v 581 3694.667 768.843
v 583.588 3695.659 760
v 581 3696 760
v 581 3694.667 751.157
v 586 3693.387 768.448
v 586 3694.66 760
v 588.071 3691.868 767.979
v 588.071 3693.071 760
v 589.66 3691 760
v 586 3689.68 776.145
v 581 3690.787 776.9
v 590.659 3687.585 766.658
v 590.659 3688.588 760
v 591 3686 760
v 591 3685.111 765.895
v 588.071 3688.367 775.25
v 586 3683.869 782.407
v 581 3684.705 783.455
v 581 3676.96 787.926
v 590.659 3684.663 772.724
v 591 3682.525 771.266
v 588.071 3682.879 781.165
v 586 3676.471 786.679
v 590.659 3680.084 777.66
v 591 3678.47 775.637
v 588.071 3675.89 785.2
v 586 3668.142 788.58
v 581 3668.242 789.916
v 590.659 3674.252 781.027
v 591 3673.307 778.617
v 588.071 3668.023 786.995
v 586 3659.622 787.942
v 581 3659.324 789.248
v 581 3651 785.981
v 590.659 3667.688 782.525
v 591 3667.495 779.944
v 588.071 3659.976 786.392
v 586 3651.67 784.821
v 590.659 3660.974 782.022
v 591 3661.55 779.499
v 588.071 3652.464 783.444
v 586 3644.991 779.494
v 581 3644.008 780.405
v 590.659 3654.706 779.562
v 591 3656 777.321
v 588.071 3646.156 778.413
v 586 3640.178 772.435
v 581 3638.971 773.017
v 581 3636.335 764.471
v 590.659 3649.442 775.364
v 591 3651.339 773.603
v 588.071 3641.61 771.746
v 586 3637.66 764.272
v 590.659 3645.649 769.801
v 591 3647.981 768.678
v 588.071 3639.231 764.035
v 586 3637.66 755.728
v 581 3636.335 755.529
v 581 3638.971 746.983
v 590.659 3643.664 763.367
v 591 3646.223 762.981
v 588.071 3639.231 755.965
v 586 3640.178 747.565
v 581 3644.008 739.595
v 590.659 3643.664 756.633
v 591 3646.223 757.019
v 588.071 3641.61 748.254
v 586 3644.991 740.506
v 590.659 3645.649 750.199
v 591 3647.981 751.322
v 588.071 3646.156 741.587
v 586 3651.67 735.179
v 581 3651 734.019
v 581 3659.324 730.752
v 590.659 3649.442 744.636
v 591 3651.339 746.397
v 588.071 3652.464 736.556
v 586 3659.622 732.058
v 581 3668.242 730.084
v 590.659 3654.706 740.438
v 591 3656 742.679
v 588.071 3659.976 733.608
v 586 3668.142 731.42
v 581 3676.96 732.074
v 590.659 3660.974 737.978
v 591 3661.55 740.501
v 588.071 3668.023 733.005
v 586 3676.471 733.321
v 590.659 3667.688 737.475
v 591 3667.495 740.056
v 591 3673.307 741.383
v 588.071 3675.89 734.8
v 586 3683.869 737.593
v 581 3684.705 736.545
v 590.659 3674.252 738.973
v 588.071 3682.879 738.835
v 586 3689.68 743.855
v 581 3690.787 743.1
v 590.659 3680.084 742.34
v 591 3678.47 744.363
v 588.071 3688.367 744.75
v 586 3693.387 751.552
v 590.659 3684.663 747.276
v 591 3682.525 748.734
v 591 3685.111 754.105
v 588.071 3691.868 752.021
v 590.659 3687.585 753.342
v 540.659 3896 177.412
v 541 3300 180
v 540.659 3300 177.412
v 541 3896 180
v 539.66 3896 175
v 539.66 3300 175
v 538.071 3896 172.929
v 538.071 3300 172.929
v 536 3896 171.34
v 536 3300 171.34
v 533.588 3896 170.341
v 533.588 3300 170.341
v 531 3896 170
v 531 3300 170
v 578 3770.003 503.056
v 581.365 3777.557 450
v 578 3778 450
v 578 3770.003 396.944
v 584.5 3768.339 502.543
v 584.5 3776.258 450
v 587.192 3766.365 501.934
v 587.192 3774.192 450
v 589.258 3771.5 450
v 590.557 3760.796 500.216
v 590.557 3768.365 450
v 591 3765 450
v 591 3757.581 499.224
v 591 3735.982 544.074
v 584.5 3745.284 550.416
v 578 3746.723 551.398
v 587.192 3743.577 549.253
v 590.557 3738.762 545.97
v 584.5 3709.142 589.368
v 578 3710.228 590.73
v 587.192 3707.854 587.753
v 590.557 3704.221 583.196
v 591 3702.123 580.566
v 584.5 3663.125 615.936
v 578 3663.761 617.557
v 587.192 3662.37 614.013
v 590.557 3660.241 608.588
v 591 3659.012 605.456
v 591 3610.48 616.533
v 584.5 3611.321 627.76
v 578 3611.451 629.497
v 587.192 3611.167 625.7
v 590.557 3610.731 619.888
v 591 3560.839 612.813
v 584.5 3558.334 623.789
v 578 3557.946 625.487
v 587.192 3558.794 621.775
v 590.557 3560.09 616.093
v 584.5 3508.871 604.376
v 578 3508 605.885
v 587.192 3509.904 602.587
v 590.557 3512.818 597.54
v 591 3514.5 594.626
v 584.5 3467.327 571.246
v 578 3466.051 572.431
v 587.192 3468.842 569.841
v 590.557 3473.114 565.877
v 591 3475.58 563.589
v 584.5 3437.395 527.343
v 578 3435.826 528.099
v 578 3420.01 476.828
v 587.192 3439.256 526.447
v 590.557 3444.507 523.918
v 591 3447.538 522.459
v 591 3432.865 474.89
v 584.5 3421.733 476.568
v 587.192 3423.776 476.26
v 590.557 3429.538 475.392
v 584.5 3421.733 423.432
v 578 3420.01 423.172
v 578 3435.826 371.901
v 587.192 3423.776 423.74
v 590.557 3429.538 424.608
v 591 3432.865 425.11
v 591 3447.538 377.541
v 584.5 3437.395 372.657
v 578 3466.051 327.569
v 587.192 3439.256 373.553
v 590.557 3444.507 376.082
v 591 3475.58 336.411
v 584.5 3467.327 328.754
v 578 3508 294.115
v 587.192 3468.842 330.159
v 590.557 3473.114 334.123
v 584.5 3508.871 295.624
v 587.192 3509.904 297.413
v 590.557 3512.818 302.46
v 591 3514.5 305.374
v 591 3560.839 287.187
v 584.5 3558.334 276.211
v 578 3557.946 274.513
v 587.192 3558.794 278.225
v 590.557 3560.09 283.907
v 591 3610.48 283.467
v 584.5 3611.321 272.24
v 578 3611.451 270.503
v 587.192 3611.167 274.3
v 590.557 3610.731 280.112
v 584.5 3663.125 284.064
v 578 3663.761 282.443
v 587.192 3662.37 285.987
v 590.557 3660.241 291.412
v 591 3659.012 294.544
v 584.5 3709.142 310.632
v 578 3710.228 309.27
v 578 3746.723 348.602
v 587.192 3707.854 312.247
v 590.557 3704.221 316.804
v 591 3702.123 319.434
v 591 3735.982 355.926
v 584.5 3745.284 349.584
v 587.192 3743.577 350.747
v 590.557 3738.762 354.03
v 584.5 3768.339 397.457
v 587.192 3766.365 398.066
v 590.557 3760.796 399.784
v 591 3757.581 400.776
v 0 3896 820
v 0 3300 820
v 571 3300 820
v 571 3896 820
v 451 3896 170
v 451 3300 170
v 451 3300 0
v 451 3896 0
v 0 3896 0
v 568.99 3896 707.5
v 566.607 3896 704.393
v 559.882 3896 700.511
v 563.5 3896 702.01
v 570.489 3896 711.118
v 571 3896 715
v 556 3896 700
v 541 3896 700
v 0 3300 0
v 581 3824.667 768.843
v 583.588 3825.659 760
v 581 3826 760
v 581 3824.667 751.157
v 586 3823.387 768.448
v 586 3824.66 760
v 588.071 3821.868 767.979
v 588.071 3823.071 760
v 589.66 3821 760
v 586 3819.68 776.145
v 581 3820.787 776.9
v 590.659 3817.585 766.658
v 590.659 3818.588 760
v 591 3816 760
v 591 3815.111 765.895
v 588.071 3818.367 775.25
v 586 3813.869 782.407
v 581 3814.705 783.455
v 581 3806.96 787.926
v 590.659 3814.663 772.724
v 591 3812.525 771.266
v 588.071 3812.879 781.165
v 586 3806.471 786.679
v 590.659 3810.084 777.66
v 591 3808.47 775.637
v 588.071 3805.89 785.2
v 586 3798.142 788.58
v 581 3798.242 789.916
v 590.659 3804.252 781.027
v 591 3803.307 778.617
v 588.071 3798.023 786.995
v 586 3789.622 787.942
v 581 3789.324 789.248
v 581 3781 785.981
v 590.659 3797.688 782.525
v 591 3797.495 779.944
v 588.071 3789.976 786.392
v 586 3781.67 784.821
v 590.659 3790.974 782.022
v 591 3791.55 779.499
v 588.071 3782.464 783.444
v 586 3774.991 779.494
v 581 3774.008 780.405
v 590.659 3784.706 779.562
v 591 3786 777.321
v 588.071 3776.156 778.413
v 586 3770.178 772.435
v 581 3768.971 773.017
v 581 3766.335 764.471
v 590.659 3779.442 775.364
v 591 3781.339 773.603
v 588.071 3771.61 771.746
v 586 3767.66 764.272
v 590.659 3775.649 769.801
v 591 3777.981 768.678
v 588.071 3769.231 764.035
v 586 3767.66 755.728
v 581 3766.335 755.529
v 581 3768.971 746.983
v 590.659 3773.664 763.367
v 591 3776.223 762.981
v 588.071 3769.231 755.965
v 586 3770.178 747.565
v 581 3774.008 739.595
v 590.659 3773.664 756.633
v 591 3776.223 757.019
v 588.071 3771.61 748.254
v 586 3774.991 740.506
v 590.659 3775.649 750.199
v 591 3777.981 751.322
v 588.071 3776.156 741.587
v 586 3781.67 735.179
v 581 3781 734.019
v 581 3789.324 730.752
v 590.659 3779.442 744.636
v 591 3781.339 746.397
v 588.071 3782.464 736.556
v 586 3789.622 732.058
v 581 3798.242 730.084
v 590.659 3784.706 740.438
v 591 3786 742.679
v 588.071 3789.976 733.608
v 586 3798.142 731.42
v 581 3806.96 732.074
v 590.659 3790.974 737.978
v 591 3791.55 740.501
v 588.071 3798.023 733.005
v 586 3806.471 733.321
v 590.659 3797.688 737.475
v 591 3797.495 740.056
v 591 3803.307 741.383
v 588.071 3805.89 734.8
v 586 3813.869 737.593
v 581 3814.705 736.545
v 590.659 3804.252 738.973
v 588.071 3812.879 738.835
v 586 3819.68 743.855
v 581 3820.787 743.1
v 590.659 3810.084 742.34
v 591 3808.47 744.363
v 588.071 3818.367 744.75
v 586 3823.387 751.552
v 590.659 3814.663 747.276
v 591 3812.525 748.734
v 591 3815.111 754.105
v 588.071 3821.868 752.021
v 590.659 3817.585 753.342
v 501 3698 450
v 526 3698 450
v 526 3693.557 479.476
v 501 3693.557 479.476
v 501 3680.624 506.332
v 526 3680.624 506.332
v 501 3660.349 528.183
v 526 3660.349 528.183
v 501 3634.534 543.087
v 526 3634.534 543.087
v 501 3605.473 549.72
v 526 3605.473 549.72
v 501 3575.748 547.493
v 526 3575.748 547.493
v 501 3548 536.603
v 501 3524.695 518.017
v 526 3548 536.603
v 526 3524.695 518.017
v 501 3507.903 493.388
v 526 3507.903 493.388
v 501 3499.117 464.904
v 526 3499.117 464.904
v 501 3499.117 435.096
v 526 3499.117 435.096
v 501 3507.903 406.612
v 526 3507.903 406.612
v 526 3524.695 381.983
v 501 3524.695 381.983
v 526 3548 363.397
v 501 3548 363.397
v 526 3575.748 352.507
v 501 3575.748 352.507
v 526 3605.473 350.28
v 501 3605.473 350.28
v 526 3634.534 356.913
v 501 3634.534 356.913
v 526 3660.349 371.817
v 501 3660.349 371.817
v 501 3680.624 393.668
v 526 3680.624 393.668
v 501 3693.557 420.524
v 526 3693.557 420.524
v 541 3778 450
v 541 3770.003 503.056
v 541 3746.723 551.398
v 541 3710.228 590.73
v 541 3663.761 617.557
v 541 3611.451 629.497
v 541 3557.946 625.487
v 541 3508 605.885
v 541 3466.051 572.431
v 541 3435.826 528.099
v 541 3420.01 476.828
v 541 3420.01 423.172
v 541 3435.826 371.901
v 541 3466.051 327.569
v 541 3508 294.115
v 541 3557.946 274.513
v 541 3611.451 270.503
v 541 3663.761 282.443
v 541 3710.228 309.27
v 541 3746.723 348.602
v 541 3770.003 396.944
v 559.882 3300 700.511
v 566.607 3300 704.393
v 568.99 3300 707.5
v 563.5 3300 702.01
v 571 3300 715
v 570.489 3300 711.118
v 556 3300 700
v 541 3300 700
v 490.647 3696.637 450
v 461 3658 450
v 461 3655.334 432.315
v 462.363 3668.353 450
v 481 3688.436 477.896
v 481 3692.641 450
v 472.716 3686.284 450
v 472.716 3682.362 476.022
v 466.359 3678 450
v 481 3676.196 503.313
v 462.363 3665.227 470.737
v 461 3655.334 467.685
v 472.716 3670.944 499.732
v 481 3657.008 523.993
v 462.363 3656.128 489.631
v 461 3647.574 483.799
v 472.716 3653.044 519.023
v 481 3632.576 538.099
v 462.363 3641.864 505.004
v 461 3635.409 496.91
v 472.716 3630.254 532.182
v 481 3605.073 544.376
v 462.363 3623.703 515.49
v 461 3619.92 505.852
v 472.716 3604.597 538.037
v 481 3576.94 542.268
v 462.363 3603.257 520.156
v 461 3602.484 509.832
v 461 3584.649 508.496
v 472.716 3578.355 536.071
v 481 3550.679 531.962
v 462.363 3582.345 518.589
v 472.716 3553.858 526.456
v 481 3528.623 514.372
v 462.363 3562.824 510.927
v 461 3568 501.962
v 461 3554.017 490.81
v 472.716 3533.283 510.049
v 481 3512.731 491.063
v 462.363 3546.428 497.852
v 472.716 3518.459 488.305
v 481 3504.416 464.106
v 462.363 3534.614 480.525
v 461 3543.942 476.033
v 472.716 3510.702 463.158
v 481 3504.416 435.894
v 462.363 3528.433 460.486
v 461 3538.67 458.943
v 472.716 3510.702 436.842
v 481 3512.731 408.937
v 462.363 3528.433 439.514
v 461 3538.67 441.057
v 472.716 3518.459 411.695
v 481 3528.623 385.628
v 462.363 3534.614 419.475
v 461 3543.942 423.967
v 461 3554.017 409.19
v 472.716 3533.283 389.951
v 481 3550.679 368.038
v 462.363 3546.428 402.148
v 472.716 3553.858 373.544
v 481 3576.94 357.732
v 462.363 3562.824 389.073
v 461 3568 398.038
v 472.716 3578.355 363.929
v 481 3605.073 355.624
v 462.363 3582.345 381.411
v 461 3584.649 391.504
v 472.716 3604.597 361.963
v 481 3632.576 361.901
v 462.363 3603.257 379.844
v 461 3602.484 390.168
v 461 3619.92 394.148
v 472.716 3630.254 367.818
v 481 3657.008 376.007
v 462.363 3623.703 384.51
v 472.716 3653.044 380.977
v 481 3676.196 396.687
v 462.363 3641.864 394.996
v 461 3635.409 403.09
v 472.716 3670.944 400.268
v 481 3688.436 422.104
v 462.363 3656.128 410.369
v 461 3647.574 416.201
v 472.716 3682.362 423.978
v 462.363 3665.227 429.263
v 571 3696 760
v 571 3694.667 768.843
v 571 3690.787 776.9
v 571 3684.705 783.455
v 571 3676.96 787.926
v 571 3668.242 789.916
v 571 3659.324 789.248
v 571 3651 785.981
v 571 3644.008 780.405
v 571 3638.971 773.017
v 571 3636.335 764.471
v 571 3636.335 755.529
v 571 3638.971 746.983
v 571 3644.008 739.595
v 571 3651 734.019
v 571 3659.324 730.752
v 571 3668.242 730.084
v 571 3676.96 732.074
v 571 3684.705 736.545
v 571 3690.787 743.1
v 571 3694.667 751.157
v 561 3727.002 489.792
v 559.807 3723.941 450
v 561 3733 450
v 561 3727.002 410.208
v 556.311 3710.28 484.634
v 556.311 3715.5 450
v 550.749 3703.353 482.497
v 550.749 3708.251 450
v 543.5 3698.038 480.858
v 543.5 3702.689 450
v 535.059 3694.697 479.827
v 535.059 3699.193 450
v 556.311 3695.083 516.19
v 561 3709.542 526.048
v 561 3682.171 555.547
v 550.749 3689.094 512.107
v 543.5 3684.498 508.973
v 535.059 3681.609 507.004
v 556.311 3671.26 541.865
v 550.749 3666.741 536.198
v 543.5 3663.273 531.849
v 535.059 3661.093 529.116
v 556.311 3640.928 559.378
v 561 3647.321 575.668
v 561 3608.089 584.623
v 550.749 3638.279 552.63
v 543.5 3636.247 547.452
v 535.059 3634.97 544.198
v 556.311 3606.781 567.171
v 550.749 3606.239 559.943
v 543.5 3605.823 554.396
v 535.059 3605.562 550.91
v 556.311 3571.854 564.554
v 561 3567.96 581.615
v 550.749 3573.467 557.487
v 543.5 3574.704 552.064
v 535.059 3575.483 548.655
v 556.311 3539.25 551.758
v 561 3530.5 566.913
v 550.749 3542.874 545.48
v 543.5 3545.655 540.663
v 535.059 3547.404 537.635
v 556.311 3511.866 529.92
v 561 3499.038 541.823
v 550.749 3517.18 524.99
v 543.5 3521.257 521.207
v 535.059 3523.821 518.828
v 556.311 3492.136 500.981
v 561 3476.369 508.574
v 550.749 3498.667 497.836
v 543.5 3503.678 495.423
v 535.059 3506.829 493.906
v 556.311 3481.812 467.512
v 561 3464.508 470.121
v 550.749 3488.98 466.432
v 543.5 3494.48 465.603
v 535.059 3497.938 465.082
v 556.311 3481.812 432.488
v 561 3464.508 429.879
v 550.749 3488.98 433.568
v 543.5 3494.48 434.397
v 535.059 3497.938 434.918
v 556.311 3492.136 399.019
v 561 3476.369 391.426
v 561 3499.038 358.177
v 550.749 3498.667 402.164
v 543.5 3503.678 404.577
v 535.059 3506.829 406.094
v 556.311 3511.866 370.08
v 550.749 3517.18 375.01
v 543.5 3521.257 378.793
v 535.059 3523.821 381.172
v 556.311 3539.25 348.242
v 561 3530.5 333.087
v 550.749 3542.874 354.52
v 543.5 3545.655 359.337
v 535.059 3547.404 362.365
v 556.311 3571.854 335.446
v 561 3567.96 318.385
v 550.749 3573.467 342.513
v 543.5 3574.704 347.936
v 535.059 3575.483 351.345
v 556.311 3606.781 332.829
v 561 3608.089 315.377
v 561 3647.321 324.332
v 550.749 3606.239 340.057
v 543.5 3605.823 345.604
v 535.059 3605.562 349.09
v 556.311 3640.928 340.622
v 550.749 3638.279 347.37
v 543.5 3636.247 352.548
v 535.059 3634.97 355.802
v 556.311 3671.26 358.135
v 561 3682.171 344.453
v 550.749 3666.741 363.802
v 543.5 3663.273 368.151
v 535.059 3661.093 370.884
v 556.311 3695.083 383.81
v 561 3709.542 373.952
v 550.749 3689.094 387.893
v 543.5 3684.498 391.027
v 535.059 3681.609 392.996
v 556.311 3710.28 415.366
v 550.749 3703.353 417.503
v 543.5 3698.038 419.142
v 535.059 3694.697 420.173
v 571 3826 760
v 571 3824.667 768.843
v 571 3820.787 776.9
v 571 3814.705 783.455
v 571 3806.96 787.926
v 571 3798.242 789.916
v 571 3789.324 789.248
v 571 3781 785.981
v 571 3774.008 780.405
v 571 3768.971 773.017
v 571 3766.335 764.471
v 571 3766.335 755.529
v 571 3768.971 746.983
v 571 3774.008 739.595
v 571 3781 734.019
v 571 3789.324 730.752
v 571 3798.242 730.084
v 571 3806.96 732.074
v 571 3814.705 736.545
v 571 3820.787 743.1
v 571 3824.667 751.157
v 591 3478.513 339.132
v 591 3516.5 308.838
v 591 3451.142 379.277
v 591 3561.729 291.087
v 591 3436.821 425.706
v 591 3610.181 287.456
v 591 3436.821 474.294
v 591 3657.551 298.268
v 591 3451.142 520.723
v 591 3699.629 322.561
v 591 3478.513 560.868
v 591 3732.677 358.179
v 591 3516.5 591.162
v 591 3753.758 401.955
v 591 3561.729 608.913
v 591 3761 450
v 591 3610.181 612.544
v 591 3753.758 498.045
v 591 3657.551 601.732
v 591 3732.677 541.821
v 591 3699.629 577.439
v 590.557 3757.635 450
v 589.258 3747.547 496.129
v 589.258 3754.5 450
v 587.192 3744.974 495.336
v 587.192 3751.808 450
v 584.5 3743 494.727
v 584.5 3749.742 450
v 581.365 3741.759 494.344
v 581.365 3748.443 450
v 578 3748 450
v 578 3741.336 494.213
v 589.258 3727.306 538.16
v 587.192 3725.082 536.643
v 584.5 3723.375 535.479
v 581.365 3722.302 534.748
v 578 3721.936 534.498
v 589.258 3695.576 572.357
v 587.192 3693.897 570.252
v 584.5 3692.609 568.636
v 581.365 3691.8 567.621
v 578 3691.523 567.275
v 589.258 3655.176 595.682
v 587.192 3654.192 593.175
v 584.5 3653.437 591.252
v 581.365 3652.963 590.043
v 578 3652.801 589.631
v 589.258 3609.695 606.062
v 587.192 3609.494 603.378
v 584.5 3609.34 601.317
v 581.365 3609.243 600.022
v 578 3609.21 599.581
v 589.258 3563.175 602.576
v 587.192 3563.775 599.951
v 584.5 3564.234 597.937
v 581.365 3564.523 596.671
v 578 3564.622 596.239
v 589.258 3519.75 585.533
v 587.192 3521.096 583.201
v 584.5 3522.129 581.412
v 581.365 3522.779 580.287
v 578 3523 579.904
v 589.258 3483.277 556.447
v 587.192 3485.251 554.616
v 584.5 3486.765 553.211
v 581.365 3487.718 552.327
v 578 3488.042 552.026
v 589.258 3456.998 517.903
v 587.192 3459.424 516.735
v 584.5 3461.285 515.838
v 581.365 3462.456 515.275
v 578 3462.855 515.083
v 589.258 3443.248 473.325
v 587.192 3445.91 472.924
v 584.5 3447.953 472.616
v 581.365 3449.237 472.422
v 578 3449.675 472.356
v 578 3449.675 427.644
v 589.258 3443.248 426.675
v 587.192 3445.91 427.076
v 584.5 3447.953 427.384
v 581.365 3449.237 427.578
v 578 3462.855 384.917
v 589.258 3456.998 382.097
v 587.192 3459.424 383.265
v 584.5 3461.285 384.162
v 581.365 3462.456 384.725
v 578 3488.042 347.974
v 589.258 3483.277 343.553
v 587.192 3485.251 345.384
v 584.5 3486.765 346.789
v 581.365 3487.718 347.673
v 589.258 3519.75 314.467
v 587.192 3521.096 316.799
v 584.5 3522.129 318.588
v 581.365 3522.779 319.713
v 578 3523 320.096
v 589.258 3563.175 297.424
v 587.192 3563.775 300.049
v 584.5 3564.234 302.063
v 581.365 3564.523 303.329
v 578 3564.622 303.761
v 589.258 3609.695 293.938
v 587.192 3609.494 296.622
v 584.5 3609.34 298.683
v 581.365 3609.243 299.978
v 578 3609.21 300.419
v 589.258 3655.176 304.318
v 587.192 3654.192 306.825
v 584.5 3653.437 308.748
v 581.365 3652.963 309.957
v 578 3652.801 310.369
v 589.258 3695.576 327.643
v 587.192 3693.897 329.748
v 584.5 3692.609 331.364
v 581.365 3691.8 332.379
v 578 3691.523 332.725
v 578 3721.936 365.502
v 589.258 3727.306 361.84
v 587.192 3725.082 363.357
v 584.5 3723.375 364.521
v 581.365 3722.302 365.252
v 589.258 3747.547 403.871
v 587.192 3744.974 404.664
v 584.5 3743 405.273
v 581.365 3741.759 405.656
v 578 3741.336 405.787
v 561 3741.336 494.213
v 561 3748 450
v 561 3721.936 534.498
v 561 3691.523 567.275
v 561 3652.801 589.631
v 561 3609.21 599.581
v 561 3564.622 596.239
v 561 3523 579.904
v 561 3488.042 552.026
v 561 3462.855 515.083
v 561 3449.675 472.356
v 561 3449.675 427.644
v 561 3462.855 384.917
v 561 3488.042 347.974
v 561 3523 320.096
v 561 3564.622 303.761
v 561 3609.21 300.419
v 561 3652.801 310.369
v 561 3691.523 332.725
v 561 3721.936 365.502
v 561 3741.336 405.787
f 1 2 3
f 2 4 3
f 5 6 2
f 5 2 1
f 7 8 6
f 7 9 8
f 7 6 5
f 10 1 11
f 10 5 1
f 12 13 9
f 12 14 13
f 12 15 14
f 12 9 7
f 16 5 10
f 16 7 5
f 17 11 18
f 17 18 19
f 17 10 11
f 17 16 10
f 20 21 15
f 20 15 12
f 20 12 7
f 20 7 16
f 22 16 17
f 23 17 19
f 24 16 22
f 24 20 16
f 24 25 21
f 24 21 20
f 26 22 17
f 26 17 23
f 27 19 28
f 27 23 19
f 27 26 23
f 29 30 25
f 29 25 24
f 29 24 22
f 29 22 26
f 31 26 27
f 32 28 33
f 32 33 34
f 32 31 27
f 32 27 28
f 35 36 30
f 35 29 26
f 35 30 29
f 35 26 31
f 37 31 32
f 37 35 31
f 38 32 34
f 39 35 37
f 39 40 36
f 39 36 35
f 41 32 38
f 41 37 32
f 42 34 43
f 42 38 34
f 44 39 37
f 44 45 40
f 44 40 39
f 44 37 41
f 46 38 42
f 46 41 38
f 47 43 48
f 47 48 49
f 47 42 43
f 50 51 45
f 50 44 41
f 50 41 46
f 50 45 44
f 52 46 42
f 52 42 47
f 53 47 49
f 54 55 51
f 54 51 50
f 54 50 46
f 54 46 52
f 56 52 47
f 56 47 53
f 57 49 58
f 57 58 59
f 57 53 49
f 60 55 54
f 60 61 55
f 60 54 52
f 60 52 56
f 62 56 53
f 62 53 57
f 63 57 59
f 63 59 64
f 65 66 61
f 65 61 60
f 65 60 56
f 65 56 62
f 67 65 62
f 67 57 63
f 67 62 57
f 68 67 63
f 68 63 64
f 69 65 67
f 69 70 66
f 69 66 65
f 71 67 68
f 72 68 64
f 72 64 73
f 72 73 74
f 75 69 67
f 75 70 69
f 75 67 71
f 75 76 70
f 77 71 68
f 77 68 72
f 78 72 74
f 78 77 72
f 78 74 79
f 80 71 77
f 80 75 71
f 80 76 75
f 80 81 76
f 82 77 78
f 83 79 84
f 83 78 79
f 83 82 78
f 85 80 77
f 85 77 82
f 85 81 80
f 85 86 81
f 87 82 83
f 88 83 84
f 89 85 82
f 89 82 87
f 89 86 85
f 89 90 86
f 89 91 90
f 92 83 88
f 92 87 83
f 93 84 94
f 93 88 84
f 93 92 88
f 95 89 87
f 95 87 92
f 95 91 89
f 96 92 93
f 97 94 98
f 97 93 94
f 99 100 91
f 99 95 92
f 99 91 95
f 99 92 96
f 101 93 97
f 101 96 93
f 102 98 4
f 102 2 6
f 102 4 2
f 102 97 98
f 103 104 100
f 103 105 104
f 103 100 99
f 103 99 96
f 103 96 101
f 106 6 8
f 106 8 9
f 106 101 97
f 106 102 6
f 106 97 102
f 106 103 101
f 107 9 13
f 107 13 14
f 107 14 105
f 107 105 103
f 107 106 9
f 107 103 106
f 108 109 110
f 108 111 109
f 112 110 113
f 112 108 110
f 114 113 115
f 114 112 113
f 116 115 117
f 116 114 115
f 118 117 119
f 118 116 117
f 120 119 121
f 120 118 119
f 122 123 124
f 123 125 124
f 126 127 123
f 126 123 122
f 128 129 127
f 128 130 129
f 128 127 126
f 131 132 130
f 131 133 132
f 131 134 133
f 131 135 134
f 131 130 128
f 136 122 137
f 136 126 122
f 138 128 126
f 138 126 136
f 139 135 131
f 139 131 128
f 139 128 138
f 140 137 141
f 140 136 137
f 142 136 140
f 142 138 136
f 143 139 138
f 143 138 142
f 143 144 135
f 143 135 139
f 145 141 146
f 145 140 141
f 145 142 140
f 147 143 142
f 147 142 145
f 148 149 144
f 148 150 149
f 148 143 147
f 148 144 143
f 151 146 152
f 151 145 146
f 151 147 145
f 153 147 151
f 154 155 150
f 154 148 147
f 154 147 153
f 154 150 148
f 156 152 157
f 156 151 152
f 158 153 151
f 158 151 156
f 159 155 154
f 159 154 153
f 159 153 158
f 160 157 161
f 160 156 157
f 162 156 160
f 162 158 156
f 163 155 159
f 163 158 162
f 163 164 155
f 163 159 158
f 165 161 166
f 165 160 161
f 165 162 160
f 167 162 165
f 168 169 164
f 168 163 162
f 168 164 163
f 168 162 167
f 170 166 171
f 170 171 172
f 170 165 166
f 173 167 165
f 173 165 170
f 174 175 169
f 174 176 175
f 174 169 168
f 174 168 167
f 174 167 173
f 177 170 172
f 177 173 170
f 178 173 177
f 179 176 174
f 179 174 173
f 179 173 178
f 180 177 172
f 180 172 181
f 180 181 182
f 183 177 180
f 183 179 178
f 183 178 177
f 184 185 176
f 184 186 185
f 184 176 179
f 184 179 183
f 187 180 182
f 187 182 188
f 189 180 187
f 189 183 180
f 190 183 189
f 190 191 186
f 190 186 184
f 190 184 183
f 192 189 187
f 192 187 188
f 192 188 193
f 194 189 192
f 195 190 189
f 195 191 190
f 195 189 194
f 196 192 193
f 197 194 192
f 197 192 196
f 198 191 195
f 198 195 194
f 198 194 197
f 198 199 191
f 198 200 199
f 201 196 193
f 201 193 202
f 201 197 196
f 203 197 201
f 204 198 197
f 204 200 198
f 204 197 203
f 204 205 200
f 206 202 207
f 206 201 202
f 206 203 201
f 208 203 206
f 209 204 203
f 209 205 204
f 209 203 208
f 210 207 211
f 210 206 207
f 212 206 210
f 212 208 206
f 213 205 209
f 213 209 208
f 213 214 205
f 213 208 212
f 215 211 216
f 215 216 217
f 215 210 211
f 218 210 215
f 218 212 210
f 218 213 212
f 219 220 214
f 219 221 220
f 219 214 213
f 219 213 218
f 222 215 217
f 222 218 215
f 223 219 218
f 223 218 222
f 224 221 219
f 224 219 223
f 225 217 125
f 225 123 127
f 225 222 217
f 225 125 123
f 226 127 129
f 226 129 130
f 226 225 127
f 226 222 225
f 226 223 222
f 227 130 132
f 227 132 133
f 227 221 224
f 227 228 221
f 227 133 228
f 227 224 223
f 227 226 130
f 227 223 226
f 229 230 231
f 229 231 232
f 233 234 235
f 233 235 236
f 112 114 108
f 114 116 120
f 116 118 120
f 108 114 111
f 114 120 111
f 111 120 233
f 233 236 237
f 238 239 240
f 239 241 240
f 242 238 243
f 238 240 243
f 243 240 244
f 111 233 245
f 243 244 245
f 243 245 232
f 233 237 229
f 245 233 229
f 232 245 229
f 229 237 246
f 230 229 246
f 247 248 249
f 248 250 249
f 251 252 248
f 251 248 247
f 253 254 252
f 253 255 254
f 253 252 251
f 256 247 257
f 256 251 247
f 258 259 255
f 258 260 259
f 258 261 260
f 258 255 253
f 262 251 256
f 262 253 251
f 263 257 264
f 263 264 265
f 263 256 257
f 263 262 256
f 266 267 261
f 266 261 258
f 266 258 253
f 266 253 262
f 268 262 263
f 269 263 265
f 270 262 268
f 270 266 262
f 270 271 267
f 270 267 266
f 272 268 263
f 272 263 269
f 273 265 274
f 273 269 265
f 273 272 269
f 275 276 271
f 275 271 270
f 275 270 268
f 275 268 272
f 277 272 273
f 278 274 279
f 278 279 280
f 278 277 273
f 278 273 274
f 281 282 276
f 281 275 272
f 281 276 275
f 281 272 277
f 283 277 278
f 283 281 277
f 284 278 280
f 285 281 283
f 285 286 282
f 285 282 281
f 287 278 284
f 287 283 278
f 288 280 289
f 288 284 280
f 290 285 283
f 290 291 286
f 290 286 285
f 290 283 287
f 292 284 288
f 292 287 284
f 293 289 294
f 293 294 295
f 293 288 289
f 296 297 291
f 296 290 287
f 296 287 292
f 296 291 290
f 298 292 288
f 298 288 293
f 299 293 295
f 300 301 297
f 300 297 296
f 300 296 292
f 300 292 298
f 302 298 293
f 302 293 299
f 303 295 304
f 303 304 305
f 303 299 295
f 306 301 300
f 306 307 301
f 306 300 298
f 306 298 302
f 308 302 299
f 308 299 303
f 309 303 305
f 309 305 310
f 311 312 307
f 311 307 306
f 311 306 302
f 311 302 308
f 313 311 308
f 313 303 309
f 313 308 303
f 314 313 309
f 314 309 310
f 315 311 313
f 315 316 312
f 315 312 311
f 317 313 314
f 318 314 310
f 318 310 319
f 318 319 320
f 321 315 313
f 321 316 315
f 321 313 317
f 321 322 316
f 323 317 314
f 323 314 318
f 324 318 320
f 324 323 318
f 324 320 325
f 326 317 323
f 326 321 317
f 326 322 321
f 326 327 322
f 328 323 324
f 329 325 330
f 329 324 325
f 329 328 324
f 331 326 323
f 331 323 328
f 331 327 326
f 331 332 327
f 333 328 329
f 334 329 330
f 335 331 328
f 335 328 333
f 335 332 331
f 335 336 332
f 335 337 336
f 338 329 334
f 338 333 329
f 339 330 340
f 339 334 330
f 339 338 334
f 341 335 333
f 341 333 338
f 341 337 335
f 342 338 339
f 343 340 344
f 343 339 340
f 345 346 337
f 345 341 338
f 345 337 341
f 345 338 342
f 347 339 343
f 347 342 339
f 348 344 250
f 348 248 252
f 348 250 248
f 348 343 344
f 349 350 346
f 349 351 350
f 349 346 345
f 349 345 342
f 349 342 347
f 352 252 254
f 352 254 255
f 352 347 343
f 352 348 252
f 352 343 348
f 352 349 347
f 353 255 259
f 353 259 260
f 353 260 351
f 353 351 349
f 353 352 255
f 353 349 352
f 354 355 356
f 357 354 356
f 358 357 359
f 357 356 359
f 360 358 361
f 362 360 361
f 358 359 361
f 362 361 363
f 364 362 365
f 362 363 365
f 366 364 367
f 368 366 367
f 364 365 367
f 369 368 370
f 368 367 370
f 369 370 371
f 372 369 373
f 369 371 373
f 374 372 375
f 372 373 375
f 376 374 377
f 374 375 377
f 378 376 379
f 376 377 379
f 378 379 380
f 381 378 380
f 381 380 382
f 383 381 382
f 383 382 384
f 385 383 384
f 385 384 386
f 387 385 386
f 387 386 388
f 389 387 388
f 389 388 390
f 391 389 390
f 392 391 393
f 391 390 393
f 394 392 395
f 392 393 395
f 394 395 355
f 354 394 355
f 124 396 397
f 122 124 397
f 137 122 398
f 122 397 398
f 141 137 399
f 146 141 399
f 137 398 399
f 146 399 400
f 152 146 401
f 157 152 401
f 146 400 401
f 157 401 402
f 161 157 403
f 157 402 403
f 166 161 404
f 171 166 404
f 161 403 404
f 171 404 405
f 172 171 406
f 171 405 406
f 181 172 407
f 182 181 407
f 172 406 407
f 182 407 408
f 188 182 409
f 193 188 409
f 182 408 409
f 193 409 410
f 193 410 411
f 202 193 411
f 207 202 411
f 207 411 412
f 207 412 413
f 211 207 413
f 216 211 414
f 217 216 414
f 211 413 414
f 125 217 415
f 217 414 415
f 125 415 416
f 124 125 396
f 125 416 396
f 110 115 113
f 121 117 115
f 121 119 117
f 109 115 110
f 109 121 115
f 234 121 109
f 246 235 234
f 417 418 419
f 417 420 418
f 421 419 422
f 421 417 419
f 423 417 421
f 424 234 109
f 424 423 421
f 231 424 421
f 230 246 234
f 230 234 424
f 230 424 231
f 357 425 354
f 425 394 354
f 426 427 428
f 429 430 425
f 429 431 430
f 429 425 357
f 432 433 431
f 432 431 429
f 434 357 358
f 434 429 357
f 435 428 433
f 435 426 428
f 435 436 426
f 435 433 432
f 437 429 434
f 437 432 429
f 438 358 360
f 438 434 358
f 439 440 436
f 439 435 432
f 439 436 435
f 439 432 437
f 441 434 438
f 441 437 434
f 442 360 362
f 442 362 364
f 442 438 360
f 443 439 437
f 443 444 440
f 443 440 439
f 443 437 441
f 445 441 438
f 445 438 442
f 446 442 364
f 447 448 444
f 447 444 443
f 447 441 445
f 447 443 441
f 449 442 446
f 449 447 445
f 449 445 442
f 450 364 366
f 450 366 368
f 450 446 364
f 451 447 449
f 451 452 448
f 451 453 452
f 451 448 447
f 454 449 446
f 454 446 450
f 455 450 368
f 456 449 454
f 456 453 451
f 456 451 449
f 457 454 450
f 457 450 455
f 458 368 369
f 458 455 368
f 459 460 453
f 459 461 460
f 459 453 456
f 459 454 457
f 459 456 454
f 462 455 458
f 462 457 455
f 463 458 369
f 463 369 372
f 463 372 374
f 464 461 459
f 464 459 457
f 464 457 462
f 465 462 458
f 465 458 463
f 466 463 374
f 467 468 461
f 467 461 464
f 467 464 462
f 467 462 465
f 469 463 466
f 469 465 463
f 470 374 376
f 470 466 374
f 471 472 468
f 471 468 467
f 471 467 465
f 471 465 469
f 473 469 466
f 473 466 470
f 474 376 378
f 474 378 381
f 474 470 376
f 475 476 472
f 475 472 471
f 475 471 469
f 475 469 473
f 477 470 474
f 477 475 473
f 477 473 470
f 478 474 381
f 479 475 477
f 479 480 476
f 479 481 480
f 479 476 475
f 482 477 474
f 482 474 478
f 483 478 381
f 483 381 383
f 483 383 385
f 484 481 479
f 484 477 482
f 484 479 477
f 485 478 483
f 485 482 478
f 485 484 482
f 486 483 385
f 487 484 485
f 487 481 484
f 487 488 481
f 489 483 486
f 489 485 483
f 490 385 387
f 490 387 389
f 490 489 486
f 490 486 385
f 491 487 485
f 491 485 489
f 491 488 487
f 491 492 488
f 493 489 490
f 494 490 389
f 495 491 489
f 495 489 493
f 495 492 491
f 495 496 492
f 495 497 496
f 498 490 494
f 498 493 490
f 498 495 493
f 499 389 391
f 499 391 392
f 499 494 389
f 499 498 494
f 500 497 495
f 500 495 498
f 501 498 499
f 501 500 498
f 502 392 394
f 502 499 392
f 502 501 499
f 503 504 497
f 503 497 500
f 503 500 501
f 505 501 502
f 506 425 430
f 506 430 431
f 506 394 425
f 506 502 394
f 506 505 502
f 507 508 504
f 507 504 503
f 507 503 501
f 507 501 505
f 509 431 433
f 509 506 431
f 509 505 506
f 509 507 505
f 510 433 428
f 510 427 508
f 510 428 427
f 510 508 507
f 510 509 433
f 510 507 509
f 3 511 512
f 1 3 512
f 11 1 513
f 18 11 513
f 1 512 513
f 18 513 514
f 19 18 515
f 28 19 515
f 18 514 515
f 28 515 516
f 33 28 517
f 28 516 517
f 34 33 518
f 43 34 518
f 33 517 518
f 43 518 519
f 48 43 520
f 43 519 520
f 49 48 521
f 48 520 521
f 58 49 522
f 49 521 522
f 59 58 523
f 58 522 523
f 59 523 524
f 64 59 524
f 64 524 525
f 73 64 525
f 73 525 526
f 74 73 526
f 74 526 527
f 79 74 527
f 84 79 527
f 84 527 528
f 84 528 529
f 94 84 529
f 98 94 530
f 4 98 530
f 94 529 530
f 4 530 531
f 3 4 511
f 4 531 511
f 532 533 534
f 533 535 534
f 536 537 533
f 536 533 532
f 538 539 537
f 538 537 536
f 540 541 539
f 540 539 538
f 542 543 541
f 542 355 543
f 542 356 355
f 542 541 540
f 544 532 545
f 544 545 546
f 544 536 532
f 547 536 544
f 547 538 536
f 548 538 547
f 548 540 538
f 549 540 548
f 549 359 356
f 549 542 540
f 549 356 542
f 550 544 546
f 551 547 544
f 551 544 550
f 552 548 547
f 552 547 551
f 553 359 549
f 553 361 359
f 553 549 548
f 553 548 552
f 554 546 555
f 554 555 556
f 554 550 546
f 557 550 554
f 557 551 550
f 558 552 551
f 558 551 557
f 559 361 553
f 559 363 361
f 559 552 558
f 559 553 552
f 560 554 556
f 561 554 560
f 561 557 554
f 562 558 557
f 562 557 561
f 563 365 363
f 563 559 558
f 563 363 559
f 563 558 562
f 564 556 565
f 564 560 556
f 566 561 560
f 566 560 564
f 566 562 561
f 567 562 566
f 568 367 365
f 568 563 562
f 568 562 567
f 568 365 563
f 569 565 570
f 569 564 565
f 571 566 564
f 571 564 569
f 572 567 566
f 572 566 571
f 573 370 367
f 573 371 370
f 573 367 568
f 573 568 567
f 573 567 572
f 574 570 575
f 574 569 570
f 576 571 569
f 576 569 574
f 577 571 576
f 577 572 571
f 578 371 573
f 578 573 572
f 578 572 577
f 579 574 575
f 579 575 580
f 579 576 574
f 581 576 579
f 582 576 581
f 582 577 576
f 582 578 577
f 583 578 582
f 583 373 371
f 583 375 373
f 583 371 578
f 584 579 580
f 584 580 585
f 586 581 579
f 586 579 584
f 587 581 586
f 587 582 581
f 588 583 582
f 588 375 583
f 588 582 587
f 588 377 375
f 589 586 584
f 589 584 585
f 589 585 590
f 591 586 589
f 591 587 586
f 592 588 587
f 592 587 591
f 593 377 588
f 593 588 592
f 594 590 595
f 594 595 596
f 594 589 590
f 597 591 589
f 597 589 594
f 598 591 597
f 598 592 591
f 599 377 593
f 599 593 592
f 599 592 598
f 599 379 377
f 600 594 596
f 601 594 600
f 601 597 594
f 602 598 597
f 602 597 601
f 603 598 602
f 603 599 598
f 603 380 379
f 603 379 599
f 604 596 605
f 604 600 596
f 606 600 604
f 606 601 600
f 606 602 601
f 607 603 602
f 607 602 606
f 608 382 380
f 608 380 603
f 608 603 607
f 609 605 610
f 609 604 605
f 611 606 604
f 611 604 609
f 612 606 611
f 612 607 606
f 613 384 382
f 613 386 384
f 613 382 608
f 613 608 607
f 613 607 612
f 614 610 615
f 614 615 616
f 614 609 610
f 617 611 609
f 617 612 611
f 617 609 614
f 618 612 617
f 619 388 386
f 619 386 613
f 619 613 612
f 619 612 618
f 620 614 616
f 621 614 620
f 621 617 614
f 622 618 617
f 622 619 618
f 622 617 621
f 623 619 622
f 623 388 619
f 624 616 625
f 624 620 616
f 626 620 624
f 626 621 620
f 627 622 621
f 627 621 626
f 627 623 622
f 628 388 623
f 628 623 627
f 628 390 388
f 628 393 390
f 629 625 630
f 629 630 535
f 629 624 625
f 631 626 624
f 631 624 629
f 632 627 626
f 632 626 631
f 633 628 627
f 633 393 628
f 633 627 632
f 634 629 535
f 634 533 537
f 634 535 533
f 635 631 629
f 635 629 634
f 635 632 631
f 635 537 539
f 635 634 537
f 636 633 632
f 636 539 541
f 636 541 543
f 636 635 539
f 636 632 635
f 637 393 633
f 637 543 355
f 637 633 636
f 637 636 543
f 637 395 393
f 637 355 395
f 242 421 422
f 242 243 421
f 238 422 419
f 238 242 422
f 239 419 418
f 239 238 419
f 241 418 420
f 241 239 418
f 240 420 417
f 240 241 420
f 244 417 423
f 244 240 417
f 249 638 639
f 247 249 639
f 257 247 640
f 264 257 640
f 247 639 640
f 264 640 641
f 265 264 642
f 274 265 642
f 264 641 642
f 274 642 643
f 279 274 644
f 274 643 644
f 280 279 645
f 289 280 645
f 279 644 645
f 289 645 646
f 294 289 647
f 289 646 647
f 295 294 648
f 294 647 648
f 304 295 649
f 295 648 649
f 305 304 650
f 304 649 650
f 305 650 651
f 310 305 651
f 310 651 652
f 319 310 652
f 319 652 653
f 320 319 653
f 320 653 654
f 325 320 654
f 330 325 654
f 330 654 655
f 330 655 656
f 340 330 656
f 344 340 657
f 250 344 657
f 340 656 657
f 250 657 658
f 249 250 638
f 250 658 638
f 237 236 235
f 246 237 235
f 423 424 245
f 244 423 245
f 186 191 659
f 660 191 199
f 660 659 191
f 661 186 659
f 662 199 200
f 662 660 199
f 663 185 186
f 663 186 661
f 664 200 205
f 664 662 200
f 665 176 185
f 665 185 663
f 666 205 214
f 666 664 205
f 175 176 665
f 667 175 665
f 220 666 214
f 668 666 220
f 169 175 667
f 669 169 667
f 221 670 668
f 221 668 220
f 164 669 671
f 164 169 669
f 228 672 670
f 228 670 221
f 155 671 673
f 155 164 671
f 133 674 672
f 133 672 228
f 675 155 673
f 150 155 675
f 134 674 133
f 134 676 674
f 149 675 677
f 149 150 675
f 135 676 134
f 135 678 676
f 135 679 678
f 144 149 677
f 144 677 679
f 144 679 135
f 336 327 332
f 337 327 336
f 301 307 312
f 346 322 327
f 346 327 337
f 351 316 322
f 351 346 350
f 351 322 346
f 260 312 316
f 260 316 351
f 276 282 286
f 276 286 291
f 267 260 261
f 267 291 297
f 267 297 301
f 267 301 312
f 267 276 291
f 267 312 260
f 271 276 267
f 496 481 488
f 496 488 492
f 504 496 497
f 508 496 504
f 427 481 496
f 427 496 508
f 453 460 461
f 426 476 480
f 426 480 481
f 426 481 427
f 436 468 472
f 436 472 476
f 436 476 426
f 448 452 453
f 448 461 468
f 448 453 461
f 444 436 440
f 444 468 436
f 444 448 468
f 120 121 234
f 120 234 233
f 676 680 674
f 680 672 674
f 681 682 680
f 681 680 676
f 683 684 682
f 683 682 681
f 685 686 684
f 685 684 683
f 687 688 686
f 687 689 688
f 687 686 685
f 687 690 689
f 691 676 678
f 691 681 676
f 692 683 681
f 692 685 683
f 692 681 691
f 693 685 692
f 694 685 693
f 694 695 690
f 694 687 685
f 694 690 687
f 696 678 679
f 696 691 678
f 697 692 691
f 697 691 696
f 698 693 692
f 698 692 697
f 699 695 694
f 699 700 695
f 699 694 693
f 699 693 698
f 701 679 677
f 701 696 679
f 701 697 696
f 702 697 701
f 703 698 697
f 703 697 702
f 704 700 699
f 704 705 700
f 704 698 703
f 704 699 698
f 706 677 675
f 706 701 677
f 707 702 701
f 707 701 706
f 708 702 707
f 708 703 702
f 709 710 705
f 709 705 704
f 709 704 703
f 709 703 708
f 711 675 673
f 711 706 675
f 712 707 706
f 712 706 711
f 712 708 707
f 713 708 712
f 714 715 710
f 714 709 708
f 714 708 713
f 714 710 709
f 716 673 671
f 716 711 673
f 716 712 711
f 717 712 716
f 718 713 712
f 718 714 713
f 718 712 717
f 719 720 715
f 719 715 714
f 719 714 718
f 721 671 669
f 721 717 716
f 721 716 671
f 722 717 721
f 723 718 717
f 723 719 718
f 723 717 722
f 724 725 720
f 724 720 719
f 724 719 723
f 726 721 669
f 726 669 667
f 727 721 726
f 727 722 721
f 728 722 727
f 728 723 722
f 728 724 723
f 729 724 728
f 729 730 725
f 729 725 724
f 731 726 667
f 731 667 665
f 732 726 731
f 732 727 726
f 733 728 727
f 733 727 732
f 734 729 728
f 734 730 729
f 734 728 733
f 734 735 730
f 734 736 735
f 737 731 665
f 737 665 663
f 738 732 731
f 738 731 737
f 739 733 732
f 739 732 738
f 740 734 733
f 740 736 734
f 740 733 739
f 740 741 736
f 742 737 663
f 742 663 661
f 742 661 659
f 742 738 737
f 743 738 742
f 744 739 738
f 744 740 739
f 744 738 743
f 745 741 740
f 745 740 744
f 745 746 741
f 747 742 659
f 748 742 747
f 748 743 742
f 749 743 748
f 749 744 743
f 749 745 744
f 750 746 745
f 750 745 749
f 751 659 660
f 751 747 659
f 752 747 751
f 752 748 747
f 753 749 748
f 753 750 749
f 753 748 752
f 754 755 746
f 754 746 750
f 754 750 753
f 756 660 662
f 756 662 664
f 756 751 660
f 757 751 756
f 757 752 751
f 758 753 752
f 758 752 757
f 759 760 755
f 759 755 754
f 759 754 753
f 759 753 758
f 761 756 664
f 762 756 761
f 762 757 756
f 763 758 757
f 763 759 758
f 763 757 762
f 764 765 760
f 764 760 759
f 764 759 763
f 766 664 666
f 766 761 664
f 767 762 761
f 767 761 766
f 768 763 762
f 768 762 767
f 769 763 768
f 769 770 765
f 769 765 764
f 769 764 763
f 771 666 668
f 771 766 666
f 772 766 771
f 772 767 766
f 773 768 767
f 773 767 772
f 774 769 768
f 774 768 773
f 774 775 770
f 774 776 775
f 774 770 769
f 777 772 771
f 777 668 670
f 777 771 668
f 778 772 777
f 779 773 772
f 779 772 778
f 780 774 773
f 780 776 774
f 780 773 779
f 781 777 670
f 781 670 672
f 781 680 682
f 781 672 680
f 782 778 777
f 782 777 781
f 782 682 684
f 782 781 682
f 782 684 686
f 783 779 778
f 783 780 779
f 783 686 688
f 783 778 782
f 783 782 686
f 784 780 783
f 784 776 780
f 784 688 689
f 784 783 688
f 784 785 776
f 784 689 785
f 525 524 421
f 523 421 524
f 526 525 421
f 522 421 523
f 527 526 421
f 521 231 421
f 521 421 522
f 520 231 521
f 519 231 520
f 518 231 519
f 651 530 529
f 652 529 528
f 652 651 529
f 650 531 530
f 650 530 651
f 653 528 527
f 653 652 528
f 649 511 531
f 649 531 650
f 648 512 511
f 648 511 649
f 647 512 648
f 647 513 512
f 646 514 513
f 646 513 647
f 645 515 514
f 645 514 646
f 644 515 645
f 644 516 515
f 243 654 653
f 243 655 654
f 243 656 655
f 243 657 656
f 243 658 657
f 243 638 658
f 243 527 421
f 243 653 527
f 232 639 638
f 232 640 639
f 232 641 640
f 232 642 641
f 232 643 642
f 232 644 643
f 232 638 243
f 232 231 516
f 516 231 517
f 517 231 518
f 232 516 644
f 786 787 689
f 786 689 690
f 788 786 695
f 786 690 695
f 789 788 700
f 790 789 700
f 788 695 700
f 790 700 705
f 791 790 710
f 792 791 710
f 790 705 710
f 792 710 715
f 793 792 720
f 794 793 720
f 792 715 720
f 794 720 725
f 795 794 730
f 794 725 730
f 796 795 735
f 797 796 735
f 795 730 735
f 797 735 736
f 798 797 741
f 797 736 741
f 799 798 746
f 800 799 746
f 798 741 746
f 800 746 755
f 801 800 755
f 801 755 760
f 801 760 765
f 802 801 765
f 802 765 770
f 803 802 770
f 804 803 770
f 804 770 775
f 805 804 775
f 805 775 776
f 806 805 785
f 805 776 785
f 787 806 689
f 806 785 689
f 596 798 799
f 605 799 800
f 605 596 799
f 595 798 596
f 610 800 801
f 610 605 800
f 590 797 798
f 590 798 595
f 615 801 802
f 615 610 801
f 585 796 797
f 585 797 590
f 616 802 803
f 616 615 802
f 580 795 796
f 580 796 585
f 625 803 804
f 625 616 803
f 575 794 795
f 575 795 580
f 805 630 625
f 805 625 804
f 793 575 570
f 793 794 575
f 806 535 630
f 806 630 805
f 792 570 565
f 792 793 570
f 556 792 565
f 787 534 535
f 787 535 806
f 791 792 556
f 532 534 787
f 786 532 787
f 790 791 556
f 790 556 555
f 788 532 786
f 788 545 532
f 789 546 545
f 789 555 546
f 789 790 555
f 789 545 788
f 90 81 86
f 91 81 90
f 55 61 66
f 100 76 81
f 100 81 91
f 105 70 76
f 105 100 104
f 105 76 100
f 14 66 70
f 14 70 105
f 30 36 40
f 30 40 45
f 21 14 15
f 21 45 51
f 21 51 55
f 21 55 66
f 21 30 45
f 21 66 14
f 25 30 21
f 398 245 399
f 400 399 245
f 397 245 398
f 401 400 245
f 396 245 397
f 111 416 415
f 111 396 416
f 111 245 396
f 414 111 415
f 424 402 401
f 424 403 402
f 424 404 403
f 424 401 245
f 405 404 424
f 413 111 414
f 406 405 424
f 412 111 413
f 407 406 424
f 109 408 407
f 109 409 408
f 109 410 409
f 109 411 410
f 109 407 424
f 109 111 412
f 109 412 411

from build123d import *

# Parameters (mm, degrees)
SKETCH004_W             = 596
SKETCH004_H             = 541
PAD_DEPTH               = 820
SKETCH005_W             = 596
SKETCH005_H             = 170
POCKET_DEPTH            = 90
SKETCH006_R             = 180
PAD001_DEPTH            = 50
SKETCH007_W             = 596
SKETCH007_H             = 120
PAD002_DEPTH            = 30
SKETCH008_R             = 150
POCKET001_DEPTH         = 30
FILLET003_R             = 13
SKETCH009_R             = 100
POCKET002_DEPTH         = 100
FILLET004_R             = 35
SKETCH010_R             = 30
PAD003_DEPTH            = 20
FILLET005_R             = 10
FILLET006_R             = 10
FILLET007_R             = 15
FILLET008_R             = 40
FILLET009_R             = 10
BODY001_PLACEMENT_ANGLE = 90


with BuildPart() as part:
    # Sketch004 → Pad (new body)
    with BuildSketch(Plane.XY):
        with Locations((298, 270.5)):
            Rectangle(SKETCH004_W, SKETCH004_H)
    extrude(amount=PAD_DEPTH)

    # Sketch005 (on Face3 of Pad) → Pocket (cut)
    with BuildSketch(Plane(origin=(0, 541, 0), x_dir=(-1, 0, 0), z_dir=(0, 1, 0))):
        with Locations((-298, 85)):
            Rectangle(SKETCH005_W, SKETCH005_H)
    extrude(amount=-POCKET_DEPTH, mode=Mode.SUBTRACT)

    # Sketch006 (on Face8 of Pocket) → Pad001 (join)
    with BuildSketch(Plane(origin=(0, 541, 0), x_dir=(-1, 0, 0), z_dir=(0, 1, 0))):
        with Locations((-298, 450)):
            Circle(SKETCH006_R)
    extrude(amount=PAD001_DEPTH)

    # Sketch007 (on Face8 of Pad001) → Pad002 (join)
    with BuildSketch(Plane(origin=(0, 541, 0), x_dir=(-1, 0, 0), z_dir=(0, 1, 0))):
        with Locations((-298, 760)):
            Rectangle(SKETCH007_W, SKETCH007_H)
    extrude(amount=PAD002_DEPTH)

    # Sketch008 (on Face15 of Pad002) → Pocket001 (cut)
    with BuildSketch(Plane(origin=(0, 591, 0), x_dir=(-1, 0, 0), z_dir=(0, 1, 0))):
        with Locations((-298, 450)):
            Circle(SKETCH008_R)
    extrude(amount=-POCKET001_DEPTH, mode=Mode.SUBTRACT)

    # Fillet003
    fillet003_edges = [part.edges().sort_by_distance(p)[0] for p in [
        (478, 591, 450),
        (448, 591, 450),
    ]]
    fillet(fillet003_edges, radius=FILLET003_R)

    # Sketch009 (on Face19 of Fillet003) → Pocket002 (cut)
    with BuildSketch(Plane(origin=(0, 561, 0), x_dir=(-1, 0, 0), z_dir=(0, 1, 0))):
        with Locations((-298, 450)):
            Circle(SKETCH009_R)
    extrude(amount=-POCKET002_DEPTH, mode=Mode.SUBTRACT)

    # Fillet004
    fillet004_edges = [part.edges().sort_by_distance(p)[0] for p in [
        (398, 561, 450),
    ]]
    fillet(fillet004_edges, radius=FILLET004_R)

    # Sketch010 (on Face21 of Fillet004) → Pad003 (join)
    with BuildSketch(Plane(origin=(0, 571, 0), x_dir=(-1, 0, 0), z_dir=(0, 1, 0))):
        with Locations((-100, 760)):
            Circle(SKETCH010_R)
        with Locations((-230, 760)):
            Circle(SKETCH010_R)
    extrude(amount=PAD003_DEPTH)

    # Fillet005
    fillet005_edges = [part.edges().sort_by_distance(p)[0] for p in [
        (260, 591, 760),
    ]]
    fillet(fillet005_edges, radius=FILLET005_R)

    # Fillet006
    fillet006_edges = [part.edges().sort_by_distance(p)[0] for p in [
        (130, 591, 760),
    ]]
    fillet(fillet006_edges, radius=FILLET006_R)

    # Fillet007
    fillet007_edges = [part.edges().sort_by_distance(p)[0] for p in [
        (298, 571, 700),
    ]]
    fillet(fillet007_edges, radius=FILLET007_R)

    # Fillet008
    fillet008_edges = [part.edges().sort_by_distance(p)[0] for p in [
        (398, 461, 450),
    ]]
    fillet(fillet008_edges, radius=FILLET008_R)

    # Fillet009
    fillet009_edges = [part.edges().sort_by_distance(p)[0] for p in [
        (298, 541, 170),
    ]]
    fillet(fillet009_edges, radius=FILLET009_R)


with BuildPart() as part_1:
    # Body001 placement: moved
    add(part.part.moved(Location((0, 3896, 0))).rotate(Axis((0, 3896, 0), (0, 0, -1)), BODY001_PLACEMENT_ANGLE))


solid = part_1.part
